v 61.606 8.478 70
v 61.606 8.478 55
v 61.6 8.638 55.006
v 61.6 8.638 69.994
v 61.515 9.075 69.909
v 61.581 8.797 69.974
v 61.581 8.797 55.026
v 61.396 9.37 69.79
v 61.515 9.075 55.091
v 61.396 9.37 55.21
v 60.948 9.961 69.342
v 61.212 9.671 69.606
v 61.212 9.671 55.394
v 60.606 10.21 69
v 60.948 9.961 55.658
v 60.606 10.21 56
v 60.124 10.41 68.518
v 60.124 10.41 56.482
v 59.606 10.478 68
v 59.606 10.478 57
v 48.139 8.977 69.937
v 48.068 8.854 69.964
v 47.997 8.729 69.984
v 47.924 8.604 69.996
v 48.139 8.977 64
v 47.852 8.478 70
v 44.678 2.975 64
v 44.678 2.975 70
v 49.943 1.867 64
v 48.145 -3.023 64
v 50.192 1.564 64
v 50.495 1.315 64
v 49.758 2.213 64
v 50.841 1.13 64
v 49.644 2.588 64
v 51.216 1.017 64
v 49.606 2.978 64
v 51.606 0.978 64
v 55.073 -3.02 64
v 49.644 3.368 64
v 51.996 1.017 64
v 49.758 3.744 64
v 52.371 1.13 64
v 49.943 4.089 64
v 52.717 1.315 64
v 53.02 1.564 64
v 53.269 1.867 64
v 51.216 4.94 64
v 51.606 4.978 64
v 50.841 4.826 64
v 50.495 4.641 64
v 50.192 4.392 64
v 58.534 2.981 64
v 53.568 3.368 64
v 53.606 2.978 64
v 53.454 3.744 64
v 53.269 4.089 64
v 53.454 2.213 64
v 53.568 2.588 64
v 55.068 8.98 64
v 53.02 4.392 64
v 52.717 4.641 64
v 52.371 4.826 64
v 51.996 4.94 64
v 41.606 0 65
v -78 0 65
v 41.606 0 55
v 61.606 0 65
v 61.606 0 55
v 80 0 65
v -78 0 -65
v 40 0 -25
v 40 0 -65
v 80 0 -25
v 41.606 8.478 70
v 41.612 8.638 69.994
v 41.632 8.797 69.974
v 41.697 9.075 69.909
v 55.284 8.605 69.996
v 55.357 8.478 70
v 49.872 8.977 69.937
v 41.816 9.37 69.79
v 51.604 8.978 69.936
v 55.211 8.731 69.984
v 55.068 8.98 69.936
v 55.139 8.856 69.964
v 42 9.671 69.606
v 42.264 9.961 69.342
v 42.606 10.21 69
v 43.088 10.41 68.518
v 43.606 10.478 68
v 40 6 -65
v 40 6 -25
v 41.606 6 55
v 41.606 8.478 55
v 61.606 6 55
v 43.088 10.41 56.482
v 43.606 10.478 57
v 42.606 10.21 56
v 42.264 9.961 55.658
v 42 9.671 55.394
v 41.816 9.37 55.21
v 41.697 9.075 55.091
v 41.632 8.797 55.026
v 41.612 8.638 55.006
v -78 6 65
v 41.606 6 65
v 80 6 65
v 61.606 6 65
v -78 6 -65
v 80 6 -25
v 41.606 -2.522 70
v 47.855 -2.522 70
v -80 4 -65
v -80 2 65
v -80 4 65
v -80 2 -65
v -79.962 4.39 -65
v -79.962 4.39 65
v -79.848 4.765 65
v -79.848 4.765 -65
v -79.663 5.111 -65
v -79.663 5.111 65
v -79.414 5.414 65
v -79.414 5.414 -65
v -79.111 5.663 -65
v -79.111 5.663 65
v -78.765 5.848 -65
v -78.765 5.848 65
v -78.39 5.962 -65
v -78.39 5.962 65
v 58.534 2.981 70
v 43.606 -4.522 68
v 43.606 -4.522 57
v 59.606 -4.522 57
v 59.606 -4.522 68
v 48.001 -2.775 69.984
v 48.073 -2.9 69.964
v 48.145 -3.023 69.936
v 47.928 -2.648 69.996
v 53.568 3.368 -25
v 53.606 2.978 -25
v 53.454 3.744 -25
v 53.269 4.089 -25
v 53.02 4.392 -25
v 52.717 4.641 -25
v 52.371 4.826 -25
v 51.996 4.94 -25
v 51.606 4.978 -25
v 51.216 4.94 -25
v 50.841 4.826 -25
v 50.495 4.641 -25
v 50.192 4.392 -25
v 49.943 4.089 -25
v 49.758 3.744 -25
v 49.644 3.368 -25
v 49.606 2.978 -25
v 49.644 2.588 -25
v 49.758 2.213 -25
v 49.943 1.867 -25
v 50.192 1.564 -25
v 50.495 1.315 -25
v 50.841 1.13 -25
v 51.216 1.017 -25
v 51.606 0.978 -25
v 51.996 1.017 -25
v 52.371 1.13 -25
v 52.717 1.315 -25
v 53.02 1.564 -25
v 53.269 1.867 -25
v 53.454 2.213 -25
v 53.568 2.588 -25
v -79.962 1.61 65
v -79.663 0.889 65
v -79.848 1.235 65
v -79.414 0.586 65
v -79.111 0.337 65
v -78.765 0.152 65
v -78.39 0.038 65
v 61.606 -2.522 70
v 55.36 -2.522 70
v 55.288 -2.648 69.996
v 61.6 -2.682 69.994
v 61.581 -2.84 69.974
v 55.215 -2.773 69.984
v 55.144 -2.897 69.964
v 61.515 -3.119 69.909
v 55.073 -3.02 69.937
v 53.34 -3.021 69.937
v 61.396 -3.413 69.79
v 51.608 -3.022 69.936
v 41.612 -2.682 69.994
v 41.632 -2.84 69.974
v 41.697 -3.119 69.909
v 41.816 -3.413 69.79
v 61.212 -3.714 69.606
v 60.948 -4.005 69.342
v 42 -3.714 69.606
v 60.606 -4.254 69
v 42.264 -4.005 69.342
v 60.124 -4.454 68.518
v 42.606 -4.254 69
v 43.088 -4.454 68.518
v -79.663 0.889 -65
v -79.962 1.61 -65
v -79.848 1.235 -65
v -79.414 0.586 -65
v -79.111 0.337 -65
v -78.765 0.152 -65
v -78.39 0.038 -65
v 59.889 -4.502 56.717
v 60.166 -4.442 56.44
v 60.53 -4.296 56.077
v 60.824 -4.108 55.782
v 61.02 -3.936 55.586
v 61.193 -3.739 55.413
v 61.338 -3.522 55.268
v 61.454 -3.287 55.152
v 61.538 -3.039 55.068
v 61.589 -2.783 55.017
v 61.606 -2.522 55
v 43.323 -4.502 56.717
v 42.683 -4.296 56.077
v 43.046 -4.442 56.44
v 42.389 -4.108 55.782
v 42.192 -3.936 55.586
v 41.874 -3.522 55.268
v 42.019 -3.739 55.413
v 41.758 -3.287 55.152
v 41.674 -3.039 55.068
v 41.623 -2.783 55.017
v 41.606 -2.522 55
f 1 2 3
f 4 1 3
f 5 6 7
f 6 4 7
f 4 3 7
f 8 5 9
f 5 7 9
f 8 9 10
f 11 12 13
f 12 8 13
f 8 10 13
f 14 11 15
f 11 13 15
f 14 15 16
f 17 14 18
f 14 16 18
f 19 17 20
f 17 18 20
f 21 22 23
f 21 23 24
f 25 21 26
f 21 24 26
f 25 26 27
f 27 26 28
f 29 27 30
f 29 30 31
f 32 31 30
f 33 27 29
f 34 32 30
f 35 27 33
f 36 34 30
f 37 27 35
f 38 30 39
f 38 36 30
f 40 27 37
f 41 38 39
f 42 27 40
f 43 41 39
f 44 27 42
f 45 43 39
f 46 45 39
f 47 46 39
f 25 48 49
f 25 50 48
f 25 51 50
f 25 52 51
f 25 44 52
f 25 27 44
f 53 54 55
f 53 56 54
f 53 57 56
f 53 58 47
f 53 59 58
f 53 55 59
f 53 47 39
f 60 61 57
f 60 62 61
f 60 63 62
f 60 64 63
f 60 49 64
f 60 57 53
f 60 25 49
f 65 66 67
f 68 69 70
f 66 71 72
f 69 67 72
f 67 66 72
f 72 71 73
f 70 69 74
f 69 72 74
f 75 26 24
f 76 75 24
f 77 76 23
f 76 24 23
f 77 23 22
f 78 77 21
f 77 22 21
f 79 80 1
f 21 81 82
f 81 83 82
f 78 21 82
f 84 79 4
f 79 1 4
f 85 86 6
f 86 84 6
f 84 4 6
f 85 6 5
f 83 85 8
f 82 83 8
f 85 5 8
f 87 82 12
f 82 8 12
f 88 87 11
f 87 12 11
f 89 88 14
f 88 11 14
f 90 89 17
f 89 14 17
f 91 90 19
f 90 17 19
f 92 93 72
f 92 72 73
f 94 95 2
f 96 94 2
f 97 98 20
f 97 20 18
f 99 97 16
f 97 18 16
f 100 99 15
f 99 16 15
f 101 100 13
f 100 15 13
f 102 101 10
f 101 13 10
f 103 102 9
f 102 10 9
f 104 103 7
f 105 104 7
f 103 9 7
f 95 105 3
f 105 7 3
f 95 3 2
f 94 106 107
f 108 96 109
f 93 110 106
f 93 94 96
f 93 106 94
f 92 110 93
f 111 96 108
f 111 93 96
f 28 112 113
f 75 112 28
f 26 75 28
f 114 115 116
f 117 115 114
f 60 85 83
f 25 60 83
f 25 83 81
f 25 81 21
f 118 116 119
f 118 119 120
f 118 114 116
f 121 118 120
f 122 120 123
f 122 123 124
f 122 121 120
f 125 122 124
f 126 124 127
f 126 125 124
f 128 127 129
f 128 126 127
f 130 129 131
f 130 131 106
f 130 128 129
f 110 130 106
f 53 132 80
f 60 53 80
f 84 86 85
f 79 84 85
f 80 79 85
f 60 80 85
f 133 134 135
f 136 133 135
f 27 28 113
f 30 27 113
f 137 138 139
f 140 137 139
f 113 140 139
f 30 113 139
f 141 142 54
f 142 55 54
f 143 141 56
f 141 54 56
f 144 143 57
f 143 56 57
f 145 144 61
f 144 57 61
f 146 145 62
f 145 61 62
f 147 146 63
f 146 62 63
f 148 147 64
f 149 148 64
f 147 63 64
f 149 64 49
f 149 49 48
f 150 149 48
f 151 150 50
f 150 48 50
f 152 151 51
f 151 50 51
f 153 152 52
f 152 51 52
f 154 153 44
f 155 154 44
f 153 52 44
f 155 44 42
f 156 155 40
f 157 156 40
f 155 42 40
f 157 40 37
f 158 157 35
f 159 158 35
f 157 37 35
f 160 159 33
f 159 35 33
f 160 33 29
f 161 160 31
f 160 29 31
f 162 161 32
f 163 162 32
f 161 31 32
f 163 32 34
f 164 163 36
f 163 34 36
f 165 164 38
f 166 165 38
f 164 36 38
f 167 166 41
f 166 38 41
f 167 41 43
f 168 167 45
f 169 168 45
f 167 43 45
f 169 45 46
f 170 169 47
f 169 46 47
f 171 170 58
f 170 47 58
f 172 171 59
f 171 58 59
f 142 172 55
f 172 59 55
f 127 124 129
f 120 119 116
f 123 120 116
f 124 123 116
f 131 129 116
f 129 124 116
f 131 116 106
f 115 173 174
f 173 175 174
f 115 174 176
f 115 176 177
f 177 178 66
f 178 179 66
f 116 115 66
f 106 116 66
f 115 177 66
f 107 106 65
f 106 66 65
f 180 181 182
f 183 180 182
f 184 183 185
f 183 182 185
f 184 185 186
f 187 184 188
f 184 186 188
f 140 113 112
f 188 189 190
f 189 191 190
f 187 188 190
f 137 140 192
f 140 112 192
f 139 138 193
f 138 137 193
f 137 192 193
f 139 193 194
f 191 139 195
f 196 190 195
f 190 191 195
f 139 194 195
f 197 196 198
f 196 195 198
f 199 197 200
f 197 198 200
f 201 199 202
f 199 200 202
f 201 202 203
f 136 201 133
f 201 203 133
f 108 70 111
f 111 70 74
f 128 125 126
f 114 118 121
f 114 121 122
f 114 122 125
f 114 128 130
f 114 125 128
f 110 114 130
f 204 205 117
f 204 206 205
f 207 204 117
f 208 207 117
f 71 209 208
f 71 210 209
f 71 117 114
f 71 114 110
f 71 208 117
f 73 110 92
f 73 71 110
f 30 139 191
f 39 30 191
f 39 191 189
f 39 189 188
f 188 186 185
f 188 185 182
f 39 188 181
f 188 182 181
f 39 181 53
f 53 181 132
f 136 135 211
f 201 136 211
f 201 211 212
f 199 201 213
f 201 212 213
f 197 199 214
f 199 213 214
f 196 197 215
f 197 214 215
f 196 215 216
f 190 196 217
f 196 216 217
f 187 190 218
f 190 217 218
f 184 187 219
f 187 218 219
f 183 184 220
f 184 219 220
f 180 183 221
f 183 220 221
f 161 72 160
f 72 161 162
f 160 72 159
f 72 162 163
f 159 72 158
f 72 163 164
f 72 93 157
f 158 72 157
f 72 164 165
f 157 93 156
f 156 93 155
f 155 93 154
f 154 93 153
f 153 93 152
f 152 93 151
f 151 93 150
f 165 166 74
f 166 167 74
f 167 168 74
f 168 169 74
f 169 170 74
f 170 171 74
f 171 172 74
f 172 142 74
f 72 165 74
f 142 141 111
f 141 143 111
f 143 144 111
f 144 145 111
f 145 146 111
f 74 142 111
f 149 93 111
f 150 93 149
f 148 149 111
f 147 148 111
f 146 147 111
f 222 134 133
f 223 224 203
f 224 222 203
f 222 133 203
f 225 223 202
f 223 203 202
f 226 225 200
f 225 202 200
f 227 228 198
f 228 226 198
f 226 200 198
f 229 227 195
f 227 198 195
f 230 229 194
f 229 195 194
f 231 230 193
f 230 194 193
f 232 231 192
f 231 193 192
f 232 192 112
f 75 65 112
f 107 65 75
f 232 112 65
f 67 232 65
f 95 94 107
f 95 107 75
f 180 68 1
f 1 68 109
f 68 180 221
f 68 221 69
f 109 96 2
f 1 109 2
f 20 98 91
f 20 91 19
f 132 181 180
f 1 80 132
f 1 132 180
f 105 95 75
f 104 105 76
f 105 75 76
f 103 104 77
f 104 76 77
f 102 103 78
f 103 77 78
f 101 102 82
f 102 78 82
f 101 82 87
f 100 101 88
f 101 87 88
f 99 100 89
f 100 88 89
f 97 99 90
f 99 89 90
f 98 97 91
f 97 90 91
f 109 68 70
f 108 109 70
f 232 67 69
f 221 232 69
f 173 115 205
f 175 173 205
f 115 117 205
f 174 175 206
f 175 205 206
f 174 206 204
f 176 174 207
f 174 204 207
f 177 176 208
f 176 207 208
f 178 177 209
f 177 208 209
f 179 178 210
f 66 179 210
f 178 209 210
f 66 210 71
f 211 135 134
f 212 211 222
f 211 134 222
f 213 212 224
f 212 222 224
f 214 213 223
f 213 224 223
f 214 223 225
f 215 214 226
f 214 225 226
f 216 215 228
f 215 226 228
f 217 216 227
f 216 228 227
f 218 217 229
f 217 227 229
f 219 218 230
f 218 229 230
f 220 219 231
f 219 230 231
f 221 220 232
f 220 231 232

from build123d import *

# Parameters (mm, degrees)
SKETCH2_W                = 160
SKETCH2_H                = 130
BOSS_EXTRUDE1_DEPTH      = 6
SKETCH7_W                = 40
SKETCH7_H                = 40
CUT_EXTRUDE1_DEPTH       = 18
SKETCH9_R                = 2
CUT_EXTRUDE2_DEPTH       = 63
BOSS_EXTRUDE2_DEPTH      = 5
BOSS_EXTRUDE2_DEPTH_BACK = 10
SKETCH11_W               = 20
SKETCH11_H               = 15
CUT_EXTRUDE4_DEPTH       = 6
SKETCH13_R               = 2
CUT_EXTRUDE5_DEPTH       = 222
FILLET4_R                = 2
FILLET5_R                = 2
FILLET6_R                = 2


with BuildPart() as part:
    # Sketch2 → Boss-Extrude1 (new body)
    with BuildSketch(Plane(origin=(0, 0, 0), x_dir=(1, 0, 0), z_dir=(0, 1, 0))):
        Rectangle(SKETCH2_W, SKETCH2_H)
    extrude(amount=BOSS_EXTRUDE1_DEPTH)

    # Sketch7 → Cut-Extrude1 (cut)
    with BuildSketch(Plane(origin=(0, 6, 0), x_dir=(1, 0, 0), z_dir=(0, 1, 0))):
        with Locations((60, 45)):
            Rectangle(SKETCH7_W, SKETCH7_H)
    extrude(amount=-CUT_EXTRUDE1_DEPTH, mode=Mode.SUBTRACT)

    # Sketch9 → Cut-Extrude2 (cut)
    with BuildSketch(Plane.XY.offset(65)):
        with Locations((51.606058682, 2.978215898)):
            Circle(SKETCH9_R)
    extrude(amount=-CUT_EXTRUDE2_DEPTH, mode=Mode.SUBTRACT)

    # Sketch11 → Boss-Extrude2 (add, two sides: drawn at the far end of the back side and taken through both)
    with BuildSketch(Plane.XY.offset(65).offset(-BOSS_EXTRUDE2_DEPTH_BACK)):
        with Locations((51.606058682, 2.978215898)):
            Rectangle(SKETCH11_W, SKETCH11_H)
    extrude(amount=BOSS_EXTRUDE2_DEPTH + BOSS_EXTRUDE2_DEPTH_BACK)

    # Sketch12 → Cut-Extrude4 (cut)
    with BuildSketch(Plane.XY.offset(70)):
        Polygon((55.07279114, -3.020264415), (58.534261247, 2.981254118), (55.067528789, 8.979734431), (48.139326225, 8.976696212), (44.677856118, 2.975177679), (48.144588576, -3.023302634), align=None)
    extrude(amount=-CUT_EXTRUDE4_DEPTH, mode=Mode.SUBTRACT)

    # Sketch13 → Cut-Extrude5 (cut)
    with BuildSketch(Plane.XY.offset(64)):
        with Locations((51.606058682, 2.978215898)):
            Circle(SKETCH13_R)
    extrude(amount=-CUT_EXTRUDE5_DEPTH, mode=Mode.SUBTRACT)

    # Fillet4
    fillet4_edges = [part.edges().sort_by_distance(p)[0] for p in [
        (-80, 6, 0),
        (-80, 0, 0),
    ]]
    fillet(fillet4_edges, radius=FILLET4_R)

    # Fillet5
    # the kernel refuses this fillet: 2 mm, written as the material it takes off along each edge
    with BuildSketch(Plane(origin=(36.606058682, -4.521784102, 70), x_dir=(0, 0, -1), z_dir=(1, 0, 0)), Plane(origin=(36.606058682, -4.521784102, 55), x_dir=(0, 1, 0), z_dir=(1, 0, 0))) as fillet5_piece_1:
        with BuildLine():
            CenterArc((FILLET5_R, FILLET5_R), FILLET5_R, 180, 90)
            Line((0, FILLET5_R), (0, 0))
            Line((0, 0), (FILLET5_R, 0))
        make_face()
    extrude(amount=30, mode=Mode.SUBTRACT)
    with BuildSketch(Plane(origin=(61.606058682, -4.521784102, 50), x_dir=(0, 1, 0), z_dir=(0, 0, 1)), Plane(origin=(41.606058682, -4.521784102, 75), x_dir=(0, 1, 0), z_dir=(0, 0, -1))) as fillet5_piece_2:
        with BuildLine():
            CenterArc((FILLET5_R, FILLET5_R), FILLET5_R, 180, 90)
            Line((0, FILLET5_R), (0, 0))
            Line((0, 0), (FILLET5_R, 0))
        make_face()
    extrude(amount=25, mode=Mode.SUBTRACT)

    # Fillet6
    # the kernel refuses this fillet: 2 mm, written as the material it takes off along each edge
    with BuildSketch(Plane(origin=(66.606058682, 10.478215898, 70), x_dir=(0, 0, -1), z_dir=(-1, 0, 0))) as fillet6_piece_1:
        with BuildLine():
            CenterArc((FILLET6_R, FILLET6_R), FILLET6_R, 180, 90)
            Line((0, FILLET6_R), (0, 0))
            Line((0, 0), (FILLET6_R, 0))
        make_face()
    extrude(amount=30, mode=Mode.SUBTRACT)
    with BuildSketch(Plane(origin=(41.606058682, 10.478215898, 75), x_dir=(0, -1, 0), z_dir=(0, 0, -1)), Plane(origin=(61.606058682, 10.478215898, 50), x_dir=(0, -1, 0), z_dir=(0, 0, 1))) as fillet6_piece_2:
        with BuildLine():
            CenterArc((FILLET6_R, -FILLET6_R), FILLET6_R, 90, 90)
            Line((0, -FILLET6_R), (0, 0))
            Line((0, 0), (FILLET6_R, 0))
        make_face()
    extrude(amount=25, mode=Mode.SUBTRACT)
    with BuildSketch(Plane(origin=(66.606058682, 10.478215898, 55), x_dir=(0, 0, 1), z_dir=(-1, 0, 0))) as fillet6_piece_3:
        with BuildLine():
            CenterArc((FILLET6_R, -FILLET6_R), FILLET6_R, 90, 90)
            Line((0, -FILLET6_R), (0, 0))
            Line((0, 0), (FILLET6_R, 0))
        make_face()
    extrude(amount=30, mode=Mode.SUBTRACT)


solid = part.part
